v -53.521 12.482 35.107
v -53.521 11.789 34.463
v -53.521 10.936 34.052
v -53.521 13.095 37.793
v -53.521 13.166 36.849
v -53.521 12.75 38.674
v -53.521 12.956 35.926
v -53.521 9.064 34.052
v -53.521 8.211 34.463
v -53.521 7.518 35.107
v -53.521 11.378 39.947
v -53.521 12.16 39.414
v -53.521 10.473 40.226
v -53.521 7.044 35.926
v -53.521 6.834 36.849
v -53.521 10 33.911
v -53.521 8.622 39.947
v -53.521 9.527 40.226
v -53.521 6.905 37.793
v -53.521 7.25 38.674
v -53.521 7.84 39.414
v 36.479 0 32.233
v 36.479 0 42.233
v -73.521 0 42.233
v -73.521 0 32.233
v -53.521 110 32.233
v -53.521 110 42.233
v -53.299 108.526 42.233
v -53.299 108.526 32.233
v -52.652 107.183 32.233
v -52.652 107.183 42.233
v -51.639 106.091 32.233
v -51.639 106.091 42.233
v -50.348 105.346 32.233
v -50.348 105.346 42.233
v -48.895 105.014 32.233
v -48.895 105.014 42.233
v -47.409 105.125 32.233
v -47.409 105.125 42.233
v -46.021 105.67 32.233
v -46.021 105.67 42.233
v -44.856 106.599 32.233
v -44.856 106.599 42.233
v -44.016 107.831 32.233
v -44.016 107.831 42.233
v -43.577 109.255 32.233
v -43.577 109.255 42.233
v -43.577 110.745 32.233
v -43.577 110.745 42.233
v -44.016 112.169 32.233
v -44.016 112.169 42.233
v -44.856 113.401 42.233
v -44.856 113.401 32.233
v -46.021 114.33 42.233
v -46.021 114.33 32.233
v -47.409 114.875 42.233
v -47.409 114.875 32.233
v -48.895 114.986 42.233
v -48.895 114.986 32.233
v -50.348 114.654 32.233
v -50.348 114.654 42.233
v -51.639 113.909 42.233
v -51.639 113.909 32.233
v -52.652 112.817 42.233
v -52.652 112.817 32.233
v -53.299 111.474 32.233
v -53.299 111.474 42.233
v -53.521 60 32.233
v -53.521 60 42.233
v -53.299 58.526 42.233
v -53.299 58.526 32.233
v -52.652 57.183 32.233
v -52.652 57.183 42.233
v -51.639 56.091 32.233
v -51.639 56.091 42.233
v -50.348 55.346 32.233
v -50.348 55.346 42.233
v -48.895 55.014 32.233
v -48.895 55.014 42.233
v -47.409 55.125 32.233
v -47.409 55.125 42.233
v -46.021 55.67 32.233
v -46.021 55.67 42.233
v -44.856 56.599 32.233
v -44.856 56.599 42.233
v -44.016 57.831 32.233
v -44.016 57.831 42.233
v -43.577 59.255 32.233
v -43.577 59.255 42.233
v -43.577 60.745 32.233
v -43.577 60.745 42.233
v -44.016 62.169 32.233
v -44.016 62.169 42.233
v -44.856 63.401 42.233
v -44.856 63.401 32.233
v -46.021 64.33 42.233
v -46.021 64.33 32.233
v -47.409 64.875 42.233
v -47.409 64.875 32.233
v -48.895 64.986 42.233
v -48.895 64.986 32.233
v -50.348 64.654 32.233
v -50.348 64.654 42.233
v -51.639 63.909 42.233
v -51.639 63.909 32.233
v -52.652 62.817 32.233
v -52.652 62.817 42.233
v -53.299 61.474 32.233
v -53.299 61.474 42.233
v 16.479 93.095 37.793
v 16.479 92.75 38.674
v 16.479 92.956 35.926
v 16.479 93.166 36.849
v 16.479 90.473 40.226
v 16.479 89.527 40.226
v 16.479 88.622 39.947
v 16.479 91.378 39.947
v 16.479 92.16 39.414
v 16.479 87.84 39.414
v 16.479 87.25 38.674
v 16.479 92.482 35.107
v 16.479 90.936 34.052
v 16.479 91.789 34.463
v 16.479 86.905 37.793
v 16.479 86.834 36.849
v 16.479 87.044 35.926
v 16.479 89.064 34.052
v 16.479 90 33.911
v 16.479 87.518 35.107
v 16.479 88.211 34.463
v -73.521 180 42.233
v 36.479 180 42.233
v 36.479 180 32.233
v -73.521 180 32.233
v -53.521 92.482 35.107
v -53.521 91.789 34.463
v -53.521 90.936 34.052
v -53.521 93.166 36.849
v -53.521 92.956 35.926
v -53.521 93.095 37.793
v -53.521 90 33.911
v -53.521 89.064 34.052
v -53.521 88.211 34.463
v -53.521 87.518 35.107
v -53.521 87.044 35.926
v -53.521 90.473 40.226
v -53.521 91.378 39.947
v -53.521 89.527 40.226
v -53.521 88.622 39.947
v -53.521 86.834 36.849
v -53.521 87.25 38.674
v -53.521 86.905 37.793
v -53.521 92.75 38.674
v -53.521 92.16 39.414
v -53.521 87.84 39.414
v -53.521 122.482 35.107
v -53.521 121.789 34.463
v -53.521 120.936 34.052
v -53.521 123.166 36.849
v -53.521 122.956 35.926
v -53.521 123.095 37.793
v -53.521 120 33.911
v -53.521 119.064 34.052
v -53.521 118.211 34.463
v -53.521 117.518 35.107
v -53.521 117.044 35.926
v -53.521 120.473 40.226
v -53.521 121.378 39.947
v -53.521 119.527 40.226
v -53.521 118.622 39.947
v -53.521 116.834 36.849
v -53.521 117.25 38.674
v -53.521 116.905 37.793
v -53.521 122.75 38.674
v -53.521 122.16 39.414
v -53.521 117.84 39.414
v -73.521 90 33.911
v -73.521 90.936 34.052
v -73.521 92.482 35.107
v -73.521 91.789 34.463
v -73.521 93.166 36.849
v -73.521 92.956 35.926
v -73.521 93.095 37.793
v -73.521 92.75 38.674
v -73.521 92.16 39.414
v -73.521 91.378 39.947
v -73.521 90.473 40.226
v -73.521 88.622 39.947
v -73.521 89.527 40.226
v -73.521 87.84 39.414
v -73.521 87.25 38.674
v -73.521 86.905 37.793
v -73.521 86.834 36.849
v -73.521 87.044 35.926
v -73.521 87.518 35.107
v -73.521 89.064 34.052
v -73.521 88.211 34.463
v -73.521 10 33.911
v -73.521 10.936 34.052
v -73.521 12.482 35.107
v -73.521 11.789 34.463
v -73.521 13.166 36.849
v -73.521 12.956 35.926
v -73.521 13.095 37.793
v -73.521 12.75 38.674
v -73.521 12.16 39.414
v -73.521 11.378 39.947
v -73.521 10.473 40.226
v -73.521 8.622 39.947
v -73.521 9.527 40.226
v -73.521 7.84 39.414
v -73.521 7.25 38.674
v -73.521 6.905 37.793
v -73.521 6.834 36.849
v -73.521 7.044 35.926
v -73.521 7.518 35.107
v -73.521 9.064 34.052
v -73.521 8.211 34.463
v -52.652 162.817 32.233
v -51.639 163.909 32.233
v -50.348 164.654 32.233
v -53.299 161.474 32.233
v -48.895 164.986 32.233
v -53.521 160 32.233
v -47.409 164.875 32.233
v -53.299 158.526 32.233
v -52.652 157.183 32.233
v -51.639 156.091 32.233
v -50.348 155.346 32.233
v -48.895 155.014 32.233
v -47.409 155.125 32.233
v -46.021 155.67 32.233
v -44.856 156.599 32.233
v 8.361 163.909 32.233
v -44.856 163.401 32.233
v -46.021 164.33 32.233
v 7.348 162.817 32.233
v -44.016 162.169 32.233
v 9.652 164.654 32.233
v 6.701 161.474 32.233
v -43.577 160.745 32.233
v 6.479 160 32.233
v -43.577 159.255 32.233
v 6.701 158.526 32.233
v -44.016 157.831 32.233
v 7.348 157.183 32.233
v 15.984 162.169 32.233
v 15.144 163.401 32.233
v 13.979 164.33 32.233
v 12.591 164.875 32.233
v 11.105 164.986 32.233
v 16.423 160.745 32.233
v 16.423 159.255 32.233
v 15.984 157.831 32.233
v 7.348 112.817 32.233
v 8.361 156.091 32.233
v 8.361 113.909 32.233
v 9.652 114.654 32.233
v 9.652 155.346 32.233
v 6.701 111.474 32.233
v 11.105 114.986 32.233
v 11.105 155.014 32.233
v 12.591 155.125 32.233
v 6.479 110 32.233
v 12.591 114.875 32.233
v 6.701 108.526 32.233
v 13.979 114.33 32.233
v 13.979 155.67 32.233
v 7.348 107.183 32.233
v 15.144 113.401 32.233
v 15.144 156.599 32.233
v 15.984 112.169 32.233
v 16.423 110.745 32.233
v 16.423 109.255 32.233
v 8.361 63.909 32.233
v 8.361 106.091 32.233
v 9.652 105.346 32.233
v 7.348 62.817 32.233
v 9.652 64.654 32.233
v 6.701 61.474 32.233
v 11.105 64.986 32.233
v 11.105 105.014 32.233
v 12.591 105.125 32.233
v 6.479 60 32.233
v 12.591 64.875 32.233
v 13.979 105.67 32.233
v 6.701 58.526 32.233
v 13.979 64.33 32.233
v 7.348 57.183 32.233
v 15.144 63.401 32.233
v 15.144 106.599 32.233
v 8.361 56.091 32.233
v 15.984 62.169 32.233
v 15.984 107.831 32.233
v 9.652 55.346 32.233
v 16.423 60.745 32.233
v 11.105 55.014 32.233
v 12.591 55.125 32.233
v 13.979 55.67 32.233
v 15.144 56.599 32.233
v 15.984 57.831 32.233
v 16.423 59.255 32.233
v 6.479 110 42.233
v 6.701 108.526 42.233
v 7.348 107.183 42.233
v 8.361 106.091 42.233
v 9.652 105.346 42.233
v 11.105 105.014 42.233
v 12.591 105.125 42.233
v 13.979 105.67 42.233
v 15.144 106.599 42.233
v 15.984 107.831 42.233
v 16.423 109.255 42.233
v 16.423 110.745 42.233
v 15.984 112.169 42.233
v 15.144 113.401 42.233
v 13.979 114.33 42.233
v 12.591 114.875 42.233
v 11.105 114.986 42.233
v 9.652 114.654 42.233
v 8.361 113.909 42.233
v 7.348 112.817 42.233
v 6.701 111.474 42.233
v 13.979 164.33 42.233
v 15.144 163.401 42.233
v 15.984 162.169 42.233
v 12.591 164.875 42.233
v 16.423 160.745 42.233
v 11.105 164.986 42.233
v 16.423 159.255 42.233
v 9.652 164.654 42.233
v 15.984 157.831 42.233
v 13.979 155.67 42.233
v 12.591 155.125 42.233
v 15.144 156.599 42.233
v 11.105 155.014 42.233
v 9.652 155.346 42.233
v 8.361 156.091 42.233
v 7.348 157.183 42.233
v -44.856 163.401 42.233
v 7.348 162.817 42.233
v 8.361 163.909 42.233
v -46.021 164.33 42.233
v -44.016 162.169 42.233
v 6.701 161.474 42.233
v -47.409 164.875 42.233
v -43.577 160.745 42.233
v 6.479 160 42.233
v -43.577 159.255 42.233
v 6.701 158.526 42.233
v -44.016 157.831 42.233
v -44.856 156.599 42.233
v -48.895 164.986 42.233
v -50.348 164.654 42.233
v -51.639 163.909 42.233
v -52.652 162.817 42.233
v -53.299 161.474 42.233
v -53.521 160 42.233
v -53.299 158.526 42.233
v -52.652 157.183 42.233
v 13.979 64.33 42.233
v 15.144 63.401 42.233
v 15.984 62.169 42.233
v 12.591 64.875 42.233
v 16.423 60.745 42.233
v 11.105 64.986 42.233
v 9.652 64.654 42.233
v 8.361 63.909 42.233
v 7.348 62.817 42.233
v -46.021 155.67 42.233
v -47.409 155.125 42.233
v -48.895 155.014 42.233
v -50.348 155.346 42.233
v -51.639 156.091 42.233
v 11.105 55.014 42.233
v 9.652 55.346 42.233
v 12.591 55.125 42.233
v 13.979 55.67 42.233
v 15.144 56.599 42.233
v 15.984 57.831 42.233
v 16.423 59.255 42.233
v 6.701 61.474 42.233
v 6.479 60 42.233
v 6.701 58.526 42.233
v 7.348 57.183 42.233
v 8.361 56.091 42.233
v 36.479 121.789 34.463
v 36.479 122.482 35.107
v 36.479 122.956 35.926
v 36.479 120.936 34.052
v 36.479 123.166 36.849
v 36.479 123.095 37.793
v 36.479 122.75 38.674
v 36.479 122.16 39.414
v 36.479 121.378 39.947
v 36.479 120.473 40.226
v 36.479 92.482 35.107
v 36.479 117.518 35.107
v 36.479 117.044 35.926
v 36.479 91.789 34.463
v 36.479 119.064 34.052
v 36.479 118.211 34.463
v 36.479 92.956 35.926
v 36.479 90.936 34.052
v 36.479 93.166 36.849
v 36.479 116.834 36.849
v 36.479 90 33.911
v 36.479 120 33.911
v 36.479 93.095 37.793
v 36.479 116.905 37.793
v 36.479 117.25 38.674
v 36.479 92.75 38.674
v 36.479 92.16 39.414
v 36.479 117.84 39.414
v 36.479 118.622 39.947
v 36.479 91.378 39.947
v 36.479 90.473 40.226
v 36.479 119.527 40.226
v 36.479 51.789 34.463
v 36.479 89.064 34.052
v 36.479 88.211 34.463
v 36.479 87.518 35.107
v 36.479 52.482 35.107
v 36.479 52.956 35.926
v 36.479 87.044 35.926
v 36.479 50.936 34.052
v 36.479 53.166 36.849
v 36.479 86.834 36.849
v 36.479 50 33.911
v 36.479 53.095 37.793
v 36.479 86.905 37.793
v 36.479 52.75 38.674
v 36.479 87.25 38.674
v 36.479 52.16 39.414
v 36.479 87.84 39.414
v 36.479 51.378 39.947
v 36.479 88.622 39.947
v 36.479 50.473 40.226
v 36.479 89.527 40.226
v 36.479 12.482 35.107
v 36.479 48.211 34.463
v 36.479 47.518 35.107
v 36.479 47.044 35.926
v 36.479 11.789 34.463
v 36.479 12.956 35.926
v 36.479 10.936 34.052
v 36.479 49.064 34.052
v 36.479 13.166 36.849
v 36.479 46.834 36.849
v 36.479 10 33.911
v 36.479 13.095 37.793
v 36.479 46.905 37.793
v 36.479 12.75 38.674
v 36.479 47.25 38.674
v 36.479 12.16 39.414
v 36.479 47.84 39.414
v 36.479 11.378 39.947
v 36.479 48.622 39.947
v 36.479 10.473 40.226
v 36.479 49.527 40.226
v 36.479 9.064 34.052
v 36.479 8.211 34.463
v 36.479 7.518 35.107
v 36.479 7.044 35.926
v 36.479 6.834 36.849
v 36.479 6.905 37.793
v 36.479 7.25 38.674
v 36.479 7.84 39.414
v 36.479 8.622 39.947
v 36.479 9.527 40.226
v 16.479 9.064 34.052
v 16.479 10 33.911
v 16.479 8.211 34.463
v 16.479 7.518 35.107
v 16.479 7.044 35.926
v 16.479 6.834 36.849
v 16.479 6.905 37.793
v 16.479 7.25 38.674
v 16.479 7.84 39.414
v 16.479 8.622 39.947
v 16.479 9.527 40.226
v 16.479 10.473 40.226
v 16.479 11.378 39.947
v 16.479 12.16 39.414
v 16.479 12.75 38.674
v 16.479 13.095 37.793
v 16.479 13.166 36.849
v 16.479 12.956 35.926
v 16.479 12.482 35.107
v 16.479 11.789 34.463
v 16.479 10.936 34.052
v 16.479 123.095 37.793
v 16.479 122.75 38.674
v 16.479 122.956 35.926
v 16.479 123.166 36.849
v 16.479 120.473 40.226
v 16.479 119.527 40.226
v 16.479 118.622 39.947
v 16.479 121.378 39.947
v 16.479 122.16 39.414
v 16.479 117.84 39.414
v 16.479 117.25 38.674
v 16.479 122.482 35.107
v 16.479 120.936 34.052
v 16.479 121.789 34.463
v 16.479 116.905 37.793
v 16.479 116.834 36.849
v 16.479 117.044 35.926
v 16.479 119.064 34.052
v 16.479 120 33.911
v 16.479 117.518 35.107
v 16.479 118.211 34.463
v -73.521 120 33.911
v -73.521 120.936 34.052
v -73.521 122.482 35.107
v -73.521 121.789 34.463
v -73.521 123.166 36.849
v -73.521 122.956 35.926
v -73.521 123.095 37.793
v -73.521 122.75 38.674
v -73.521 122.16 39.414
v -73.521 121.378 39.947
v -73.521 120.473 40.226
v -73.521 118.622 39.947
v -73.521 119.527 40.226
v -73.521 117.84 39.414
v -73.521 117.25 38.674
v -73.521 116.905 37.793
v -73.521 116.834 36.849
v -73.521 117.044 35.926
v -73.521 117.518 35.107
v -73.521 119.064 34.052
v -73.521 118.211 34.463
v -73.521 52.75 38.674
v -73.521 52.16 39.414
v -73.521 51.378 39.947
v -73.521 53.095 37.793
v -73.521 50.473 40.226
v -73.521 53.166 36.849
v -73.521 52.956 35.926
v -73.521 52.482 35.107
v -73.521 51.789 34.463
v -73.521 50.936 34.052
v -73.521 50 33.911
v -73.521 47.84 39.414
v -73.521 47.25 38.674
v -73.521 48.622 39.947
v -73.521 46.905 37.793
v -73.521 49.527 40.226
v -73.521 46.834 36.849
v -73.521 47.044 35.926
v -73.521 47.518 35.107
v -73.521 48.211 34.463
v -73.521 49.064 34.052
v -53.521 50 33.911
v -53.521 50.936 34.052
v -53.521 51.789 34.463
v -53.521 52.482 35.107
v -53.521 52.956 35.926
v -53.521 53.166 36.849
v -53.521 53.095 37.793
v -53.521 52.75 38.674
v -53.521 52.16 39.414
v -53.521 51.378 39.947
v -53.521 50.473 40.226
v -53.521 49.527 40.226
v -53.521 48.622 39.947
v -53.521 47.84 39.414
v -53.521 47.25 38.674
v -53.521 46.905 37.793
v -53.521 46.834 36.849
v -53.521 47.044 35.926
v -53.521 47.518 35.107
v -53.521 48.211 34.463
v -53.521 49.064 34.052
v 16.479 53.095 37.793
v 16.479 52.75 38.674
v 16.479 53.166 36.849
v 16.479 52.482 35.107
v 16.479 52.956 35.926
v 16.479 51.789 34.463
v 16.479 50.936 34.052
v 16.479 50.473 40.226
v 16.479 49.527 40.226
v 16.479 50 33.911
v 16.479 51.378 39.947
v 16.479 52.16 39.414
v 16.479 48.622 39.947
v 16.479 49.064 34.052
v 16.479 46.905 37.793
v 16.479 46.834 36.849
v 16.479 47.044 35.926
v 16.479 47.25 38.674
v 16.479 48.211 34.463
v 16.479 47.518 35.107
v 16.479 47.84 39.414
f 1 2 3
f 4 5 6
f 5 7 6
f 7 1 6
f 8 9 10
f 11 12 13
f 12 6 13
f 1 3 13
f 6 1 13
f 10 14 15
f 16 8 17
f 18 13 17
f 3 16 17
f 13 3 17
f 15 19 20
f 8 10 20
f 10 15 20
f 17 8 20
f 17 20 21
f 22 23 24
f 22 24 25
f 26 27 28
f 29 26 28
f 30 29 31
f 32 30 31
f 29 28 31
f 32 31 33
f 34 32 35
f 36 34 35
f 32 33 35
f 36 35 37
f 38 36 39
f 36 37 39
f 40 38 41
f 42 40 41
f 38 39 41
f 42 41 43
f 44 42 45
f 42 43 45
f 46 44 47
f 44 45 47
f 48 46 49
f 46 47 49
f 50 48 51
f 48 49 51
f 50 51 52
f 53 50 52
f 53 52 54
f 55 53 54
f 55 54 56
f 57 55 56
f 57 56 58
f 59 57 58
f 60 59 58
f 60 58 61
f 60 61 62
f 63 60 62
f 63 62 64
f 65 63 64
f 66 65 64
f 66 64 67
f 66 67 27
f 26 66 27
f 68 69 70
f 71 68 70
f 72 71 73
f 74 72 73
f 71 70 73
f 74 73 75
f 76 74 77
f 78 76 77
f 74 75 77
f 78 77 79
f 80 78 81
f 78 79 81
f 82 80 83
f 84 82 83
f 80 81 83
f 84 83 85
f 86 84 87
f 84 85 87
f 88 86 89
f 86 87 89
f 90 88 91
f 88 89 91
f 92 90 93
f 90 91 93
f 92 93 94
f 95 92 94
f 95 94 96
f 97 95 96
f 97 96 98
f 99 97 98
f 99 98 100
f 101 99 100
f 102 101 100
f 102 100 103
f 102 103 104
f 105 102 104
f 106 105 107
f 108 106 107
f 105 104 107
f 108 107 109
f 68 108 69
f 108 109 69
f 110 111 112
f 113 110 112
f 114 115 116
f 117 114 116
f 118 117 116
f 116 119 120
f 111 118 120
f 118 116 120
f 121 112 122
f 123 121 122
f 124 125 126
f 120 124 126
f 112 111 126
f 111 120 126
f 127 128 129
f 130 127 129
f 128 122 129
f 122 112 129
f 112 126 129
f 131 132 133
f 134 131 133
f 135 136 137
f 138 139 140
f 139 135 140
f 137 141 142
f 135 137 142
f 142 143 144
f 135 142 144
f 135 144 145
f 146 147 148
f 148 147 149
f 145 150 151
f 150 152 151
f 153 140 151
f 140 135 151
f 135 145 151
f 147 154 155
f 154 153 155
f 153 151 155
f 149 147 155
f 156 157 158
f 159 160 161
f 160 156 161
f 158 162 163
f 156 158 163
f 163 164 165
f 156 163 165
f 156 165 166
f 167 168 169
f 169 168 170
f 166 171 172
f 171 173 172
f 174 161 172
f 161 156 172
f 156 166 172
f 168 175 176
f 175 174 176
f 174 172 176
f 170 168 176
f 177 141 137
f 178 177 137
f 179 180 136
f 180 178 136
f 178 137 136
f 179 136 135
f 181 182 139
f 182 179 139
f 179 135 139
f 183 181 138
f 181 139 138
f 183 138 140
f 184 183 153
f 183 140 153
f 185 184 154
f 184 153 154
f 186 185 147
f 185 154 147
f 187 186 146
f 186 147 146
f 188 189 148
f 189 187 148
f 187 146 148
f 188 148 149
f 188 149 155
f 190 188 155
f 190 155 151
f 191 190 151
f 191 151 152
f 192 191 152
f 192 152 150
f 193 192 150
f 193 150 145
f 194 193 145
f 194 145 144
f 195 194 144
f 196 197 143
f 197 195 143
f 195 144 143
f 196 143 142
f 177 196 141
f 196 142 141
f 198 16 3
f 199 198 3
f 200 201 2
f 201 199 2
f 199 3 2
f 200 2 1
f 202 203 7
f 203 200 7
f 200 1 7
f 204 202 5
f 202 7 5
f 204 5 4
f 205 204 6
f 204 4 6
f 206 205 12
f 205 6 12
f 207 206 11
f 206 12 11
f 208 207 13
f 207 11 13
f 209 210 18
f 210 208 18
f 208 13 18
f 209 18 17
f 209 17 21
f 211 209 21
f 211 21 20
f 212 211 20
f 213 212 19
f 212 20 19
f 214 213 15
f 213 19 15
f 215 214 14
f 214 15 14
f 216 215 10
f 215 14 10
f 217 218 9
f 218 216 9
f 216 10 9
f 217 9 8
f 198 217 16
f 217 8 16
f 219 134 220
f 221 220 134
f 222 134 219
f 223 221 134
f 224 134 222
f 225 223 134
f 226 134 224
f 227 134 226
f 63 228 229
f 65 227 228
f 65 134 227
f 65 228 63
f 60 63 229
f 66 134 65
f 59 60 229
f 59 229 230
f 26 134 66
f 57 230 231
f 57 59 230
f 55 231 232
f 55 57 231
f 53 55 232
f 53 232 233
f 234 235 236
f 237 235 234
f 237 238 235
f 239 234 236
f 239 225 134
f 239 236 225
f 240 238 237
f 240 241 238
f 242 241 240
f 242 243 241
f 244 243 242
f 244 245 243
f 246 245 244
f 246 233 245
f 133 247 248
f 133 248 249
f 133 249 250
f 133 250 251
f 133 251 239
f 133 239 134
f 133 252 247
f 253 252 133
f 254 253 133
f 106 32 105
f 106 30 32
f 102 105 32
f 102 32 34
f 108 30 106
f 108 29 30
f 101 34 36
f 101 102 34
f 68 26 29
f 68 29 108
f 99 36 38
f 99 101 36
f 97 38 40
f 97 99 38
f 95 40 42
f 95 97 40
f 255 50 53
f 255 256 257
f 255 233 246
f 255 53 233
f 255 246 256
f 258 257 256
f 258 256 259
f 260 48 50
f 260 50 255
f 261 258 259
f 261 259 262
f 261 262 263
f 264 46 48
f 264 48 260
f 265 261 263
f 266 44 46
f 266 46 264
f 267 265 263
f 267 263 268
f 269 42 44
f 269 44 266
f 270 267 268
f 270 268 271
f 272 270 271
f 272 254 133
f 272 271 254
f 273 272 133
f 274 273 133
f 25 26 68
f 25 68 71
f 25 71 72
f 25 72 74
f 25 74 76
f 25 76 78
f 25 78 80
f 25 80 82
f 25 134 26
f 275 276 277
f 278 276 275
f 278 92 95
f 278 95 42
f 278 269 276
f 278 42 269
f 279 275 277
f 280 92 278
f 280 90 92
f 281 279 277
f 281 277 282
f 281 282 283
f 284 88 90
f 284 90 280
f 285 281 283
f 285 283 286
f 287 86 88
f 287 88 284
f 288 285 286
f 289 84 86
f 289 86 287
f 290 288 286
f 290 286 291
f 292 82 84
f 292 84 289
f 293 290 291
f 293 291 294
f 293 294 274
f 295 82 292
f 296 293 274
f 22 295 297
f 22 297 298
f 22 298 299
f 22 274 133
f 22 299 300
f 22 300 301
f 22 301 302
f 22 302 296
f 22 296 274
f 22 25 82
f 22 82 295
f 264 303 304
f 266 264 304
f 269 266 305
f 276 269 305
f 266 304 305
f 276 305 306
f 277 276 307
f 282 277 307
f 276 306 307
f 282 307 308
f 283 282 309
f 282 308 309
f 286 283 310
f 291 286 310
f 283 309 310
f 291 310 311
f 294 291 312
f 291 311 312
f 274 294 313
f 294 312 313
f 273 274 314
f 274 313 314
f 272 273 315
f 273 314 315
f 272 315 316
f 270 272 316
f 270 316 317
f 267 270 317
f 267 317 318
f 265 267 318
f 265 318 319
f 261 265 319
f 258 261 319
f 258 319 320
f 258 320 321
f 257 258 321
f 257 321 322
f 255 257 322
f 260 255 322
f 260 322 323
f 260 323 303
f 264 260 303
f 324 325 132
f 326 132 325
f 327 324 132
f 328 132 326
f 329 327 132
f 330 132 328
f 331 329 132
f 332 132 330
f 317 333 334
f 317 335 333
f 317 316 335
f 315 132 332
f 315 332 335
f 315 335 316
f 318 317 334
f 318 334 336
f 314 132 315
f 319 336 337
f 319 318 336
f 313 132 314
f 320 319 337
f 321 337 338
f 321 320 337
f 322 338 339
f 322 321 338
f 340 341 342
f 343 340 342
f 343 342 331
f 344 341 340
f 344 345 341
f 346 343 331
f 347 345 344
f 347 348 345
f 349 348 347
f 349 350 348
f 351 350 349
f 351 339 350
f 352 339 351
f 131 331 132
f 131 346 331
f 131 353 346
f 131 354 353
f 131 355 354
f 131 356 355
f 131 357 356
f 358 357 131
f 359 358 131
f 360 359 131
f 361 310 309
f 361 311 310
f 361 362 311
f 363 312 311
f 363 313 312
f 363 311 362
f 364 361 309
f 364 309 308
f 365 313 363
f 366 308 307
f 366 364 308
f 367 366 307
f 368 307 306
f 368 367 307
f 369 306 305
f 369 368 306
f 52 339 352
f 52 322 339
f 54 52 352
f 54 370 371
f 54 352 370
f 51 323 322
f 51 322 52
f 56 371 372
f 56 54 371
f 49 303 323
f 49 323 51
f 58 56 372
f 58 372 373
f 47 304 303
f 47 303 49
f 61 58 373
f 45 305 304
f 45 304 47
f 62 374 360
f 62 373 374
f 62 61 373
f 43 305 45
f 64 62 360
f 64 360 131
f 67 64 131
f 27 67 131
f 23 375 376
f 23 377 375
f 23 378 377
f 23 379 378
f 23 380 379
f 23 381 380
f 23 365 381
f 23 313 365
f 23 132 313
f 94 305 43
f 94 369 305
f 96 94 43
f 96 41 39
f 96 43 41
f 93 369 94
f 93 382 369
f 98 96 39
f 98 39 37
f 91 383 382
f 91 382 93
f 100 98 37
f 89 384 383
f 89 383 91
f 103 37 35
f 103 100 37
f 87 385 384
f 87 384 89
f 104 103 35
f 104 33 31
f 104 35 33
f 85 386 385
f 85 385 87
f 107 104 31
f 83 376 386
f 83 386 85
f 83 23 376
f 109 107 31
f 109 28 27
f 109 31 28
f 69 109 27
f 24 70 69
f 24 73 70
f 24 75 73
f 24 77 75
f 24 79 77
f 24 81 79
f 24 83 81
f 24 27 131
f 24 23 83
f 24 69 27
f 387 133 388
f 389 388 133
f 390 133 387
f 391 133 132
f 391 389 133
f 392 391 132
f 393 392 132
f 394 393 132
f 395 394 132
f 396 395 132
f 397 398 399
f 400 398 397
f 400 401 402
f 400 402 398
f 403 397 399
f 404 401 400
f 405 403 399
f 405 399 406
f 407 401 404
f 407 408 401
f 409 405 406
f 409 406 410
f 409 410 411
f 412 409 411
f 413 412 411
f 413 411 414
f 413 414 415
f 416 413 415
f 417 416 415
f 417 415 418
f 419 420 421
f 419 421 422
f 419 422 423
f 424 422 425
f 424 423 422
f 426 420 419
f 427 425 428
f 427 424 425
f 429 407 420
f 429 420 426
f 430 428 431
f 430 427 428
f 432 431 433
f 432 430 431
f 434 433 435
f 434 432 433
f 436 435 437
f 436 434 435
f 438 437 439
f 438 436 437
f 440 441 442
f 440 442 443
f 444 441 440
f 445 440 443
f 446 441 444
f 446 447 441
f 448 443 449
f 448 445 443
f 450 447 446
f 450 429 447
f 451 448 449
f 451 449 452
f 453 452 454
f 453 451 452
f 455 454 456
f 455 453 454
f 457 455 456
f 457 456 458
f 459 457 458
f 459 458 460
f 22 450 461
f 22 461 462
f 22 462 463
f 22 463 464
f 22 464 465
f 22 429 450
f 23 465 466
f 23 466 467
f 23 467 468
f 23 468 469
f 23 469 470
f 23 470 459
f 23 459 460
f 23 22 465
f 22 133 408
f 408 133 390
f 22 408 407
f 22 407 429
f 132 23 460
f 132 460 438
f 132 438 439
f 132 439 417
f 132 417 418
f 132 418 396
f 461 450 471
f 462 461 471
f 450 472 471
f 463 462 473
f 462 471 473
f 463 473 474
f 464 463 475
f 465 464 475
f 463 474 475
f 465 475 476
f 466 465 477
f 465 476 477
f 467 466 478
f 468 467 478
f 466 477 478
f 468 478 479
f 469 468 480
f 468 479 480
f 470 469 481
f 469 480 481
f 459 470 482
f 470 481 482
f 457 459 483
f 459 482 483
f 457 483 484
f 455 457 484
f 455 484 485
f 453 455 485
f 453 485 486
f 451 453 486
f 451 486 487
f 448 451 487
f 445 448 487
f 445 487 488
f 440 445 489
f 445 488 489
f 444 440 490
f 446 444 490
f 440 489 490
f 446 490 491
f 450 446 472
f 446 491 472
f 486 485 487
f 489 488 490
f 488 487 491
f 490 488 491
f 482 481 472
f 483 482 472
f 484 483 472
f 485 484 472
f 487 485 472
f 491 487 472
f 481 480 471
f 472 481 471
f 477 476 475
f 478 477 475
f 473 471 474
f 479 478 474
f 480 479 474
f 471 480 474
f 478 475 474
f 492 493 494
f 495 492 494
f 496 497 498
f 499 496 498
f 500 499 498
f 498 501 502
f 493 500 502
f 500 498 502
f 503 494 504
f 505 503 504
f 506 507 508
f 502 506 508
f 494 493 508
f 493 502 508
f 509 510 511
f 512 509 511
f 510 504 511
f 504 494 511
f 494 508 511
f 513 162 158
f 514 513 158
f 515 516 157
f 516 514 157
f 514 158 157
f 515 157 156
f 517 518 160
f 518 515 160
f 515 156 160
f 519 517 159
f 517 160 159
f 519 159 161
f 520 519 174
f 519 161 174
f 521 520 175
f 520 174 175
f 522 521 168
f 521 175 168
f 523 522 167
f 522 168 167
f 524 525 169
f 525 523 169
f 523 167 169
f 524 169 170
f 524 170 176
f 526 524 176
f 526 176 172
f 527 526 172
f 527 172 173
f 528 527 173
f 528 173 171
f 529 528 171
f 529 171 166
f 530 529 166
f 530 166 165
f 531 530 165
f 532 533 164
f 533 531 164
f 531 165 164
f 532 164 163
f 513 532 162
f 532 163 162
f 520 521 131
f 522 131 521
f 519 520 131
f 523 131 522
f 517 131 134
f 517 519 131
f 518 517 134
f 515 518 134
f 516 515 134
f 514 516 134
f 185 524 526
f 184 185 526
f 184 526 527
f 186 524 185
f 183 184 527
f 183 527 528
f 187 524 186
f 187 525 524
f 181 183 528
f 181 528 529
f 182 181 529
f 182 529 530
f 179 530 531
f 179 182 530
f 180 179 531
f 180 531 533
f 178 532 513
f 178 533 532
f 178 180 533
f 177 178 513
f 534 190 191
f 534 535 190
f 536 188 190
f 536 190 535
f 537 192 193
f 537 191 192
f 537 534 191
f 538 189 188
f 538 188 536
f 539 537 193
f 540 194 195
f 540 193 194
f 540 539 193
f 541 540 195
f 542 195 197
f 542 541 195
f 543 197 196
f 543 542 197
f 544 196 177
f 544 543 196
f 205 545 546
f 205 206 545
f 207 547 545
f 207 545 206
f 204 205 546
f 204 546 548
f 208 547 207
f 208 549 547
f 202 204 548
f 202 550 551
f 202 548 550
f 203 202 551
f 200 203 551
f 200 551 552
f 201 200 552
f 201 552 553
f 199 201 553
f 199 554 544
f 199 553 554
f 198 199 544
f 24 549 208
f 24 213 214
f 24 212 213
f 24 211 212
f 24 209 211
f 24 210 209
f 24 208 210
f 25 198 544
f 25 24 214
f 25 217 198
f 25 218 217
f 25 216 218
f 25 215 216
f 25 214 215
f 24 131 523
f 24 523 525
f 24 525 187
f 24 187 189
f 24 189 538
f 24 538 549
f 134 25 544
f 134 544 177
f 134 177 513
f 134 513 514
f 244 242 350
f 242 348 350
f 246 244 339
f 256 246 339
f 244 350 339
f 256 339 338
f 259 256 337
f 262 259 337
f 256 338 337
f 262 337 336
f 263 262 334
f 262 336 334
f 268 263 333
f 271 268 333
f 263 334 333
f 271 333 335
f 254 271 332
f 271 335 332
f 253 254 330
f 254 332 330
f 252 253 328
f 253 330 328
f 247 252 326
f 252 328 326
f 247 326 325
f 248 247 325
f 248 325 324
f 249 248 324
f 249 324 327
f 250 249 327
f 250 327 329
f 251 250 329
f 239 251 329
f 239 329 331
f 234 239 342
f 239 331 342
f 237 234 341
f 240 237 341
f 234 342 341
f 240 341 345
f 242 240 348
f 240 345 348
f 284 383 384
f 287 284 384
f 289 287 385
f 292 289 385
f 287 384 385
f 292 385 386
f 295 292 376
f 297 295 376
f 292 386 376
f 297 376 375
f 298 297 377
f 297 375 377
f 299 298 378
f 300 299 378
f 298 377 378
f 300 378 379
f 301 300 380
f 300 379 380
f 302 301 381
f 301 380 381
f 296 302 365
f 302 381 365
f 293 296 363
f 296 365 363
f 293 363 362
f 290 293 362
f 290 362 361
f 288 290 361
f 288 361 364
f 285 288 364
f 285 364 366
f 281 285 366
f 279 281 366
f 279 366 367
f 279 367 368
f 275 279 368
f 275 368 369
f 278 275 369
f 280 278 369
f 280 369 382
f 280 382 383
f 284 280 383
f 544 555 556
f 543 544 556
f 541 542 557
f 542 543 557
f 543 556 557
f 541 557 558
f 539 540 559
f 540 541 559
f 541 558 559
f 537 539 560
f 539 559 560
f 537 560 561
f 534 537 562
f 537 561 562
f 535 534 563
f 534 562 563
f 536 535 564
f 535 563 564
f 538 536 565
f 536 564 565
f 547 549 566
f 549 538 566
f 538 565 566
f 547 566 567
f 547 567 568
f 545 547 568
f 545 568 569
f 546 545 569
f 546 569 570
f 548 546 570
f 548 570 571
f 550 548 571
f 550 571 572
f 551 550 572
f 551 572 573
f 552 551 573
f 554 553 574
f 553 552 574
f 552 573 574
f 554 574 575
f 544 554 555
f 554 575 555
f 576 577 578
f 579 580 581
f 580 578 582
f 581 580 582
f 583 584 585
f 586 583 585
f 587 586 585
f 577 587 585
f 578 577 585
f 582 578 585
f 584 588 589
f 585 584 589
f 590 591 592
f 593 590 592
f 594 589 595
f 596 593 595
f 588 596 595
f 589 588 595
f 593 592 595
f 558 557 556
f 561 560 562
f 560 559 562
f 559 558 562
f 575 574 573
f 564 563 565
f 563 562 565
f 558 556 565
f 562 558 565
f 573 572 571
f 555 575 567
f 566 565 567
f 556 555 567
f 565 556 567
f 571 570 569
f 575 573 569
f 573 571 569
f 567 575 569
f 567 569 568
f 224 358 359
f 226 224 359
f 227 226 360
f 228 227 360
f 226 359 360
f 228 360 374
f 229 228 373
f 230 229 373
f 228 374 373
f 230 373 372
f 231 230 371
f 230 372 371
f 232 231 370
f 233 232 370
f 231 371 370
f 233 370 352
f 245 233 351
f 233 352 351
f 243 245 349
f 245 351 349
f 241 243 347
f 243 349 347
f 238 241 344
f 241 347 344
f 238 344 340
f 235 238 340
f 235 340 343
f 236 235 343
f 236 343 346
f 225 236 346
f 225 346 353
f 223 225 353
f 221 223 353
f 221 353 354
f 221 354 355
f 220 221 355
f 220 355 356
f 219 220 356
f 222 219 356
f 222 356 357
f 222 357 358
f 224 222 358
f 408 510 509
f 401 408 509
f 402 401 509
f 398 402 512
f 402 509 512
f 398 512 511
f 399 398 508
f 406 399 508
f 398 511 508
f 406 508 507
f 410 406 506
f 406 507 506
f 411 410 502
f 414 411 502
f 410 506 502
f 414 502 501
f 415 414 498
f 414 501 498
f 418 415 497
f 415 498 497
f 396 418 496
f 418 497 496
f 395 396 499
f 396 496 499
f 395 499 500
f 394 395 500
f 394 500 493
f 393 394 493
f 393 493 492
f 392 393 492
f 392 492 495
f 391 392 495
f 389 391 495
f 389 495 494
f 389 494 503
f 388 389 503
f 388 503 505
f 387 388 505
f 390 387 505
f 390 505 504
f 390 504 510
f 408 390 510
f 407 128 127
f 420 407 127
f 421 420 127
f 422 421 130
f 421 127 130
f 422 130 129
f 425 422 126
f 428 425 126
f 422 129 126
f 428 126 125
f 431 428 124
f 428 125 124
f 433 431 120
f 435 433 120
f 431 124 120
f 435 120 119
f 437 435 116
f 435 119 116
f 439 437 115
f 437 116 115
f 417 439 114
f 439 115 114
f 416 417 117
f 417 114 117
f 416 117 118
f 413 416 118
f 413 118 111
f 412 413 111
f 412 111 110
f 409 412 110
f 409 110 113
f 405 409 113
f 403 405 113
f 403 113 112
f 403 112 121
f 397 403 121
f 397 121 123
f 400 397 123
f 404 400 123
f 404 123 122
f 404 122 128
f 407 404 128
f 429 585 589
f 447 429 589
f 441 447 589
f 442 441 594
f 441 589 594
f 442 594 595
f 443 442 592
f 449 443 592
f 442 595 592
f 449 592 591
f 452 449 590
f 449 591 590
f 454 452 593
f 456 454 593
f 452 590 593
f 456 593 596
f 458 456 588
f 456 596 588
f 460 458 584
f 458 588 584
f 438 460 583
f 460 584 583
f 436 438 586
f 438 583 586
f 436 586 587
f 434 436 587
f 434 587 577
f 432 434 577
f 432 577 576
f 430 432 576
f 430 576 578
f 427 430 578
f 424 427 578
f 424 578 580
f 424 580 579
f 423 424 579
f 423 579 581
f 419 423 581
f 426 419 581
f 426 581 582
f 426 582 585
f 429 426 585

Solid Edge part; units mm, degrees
sketch "Sketch1" plane through (0, 0, 0) normal (0, -1, 0) x (1, 0, 0)
  line L0 (-73.5212, 32.2326) -> (36.4788, 32.2326)
  line L1 (36.4788, 32.2326) -> (36.4788, 42.2326)
  line L2 (36.4788, 42.2326) -> (-73.5212, 42.2326)
  line L3 (-73.5212, 42.2326) -> (-73.5212, 32.2326)
  dimension "D1" = 10
  dimension "D2" = 110
extrude "Protrusion1" add sketch "Sketch1" against normal blind 180
hole "Hole_1" at (36.4788, 50, 37.0863) direction (-1, 0, 0) diameter 6.35 depth 20
hole "Hole1" at (36.4788, 90, 37.0863) direction (-1, 0, 0) diameter 6.35 depth 20
hole "Hole2" at (36.4788, 120, 37.0863) direction (-1, 0, 0) diameter 6.35 depth 20
hole "Hole3" at (36.4788, 10, 37.0863) direction (-1, 0, 0) diameter 6.35 depth 20
mirror "Mirror1" about plane through (-18.5212, 90, 37.2326) normal (1, 0, 0) of "Hole_1", "Hole1", "Hole2", "Hole3"
sketch "Sketch2" plane through (-18.5212, 90, 42.2326) normal (0, 0, 1) x (-1, 0, 0)
  circle A0 centre (30, 30) radius 5
  circle A1 centre (-30, -70) radius 5
  circle A2 centre (30, -70) radius 5
  circle A3 centre (-30, -20) radius 5
  circle A4 centre (30, -20) radius 5
  circle A5 centre (-30, 30) radius 5
  dimension "D1" = 10
  dimension "D2" = 10
  dimension "D3" = 60
  dimension "D4" = 60
  dimension "D5" = 100
  dimension "D6" = 25
  dimension "D7" = 60
  dimension "D8" = 10
  dimension "D9" = 10
  dimension "D10" = 50
  dimension "D11" = 50
extrude "Cutout1" cut sketch "Sketch2" against normal through all
